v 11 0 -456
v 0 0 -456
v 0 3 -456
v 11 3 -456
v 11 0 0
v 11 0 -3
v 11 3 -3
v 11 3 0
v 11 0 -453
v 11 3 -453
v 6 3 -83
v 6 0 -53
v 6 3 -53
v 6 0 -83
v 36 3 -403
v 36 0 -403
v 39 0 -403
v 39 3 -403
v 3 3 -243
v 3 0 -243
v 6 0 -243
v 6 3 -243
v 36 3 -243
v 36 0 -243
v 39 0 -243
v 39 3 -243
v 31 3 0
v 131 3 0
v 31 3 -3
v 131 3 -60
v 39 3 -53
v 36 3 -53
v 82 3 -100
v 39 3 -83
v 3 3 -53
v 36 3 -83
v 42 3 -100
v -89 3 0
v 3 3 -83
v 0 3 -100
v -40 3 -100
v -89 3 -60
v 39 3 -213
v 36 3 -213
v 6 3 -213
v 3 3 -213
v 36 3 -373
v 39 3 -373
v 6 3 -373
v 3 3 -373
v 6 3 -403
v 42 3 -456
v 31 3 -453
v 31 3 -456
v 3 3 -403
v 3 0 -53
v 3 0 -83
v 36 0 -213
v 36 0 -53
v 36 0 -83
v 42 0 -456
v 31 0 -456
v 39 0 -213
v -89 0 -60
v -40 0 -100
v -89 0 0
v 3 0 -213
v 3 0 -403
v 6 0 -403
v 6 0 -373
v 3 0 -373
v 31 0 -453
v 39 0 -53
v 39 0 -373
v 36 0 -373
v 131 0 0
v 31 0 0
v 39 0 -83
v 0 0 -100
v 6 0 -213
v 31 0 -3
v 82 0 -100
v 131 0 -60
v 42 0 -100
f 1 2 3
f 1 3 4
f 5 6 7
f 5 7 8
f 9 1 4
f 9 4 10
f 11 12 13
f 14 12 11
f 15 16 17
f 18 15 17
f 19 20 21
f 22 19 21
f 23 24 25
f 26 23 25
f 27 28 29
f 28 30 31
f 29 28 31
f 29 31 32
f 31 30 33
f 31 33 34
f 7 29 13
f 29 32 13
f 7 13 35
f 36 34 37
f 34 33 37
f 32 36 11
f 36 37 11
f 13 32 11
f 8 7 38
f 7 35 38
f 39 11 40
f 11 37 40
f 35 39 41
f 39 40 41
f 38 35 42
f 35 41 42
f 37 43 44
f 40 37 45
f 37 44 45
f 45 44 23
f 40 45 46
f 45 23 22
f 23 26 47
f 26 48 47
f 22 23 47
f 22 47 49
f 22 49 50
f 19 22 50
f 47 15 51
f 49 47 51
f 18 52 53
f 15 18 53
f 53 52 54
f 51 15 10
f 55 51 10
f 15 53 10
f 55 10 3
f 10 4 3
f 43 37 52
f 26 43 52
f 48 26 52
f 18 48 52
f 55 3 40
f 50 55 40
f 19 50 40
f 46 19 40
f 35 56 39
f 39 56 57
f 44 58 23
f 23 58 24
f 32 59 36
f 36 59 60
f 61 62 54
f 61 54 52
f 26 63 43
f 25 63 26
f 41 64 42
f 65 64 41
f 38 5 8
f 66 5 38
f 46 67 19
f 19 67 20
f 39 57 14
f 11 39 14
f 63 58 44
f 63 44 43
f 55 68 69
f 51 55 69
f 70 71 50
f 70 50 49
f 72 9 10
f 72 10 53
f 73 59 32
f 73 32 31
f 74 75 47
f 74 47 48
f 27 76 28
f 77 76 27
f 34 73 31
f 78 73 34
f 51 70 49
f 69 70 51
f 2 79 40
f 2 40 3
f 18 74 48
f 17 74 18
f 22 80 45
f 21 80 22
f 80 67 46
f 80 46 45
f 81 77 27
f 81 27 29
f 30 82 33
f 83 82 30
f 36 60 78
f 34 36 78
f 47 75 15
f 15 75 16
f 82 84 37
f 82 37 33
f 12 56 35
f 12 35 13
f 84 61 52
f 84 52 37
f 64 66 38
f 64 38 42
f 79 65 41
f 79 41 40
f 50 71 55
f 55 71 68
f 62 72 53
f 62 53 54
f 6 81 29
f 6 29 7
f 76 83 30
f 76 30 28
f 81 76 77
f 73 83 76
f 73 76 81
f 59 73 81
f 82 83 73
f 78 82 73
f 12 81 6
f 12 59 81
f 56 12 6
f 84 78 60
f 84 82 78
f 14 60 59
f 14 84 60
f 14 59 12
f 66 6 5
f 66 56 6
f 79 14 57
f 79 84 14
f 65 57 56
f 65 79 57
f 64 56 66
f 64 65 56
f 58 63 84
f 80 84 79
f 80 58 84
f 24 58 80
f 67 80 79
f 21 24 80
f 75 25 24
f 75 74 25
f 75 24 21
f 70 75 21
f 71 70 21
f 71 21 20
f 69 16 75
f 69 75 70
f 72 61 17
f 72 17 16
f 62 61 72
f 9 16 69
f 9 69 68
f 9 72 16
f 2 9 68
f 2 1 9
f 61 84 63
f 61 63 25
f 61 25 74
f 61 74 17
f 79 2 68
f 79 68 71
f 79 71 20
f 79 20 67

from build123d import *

# Parameters (mm, degrees)
SKETCH1_W           = 3
SKETCH1_H           = 30
BOSS_EXTRUDE1_DEPTH = 3


with BuildPart() as part:
    # Sketch1 → Boss-Extrude1 (new body)
    with BuildSketch(Plane(origin=(0, 0, 0), x_dir=(1, 0, 0), z_dir=(0, 1, 0))):
        Polygon((31, 456), (42, 456), (42, 100), (82, 100), (131, 60), (131, 0), (31, 0), (31, 3), (11, 3), (11, 0), (-89, 0), (-89, 60), (-40, 100), (0, 100), (0, 456), (11, 456), (11, 453), (31, 453), align=None)
        with Locations((37.5, 68)):
            Rectangle(SKETCH1_W, SKETCH1_H, mode=Mode.SUBTRACT)
        with Locations((37.5, 228)):
            Rectangle(SKETCH1_W, SKETCH1_H, mode=Mode.SUBTRACT)
        with Locations((37.5, 388)):
            Rectangle(SKETCH1_W, SKETCH1_H, mode=Mode.SUBTRACT)
        with Locations((4.5, 68)):
            Rectangle(SKETCH1_W, SKETCH1_H, mode=Mode.SUBTRACT)
        with Locations((4.5, 228)):
            Rectangle(SKETCH1_W, SKETCH1_H, mode=Mode.SUBTRACT)
        with Locations((4.5, 388)):
            Rectangle(SKETCH1_W, SKETCH1_H, mode=Mode.SUBTRACT)
    extrude(amount=BOSS_EXTRUDE1_DEPTH)


solid = part.part
